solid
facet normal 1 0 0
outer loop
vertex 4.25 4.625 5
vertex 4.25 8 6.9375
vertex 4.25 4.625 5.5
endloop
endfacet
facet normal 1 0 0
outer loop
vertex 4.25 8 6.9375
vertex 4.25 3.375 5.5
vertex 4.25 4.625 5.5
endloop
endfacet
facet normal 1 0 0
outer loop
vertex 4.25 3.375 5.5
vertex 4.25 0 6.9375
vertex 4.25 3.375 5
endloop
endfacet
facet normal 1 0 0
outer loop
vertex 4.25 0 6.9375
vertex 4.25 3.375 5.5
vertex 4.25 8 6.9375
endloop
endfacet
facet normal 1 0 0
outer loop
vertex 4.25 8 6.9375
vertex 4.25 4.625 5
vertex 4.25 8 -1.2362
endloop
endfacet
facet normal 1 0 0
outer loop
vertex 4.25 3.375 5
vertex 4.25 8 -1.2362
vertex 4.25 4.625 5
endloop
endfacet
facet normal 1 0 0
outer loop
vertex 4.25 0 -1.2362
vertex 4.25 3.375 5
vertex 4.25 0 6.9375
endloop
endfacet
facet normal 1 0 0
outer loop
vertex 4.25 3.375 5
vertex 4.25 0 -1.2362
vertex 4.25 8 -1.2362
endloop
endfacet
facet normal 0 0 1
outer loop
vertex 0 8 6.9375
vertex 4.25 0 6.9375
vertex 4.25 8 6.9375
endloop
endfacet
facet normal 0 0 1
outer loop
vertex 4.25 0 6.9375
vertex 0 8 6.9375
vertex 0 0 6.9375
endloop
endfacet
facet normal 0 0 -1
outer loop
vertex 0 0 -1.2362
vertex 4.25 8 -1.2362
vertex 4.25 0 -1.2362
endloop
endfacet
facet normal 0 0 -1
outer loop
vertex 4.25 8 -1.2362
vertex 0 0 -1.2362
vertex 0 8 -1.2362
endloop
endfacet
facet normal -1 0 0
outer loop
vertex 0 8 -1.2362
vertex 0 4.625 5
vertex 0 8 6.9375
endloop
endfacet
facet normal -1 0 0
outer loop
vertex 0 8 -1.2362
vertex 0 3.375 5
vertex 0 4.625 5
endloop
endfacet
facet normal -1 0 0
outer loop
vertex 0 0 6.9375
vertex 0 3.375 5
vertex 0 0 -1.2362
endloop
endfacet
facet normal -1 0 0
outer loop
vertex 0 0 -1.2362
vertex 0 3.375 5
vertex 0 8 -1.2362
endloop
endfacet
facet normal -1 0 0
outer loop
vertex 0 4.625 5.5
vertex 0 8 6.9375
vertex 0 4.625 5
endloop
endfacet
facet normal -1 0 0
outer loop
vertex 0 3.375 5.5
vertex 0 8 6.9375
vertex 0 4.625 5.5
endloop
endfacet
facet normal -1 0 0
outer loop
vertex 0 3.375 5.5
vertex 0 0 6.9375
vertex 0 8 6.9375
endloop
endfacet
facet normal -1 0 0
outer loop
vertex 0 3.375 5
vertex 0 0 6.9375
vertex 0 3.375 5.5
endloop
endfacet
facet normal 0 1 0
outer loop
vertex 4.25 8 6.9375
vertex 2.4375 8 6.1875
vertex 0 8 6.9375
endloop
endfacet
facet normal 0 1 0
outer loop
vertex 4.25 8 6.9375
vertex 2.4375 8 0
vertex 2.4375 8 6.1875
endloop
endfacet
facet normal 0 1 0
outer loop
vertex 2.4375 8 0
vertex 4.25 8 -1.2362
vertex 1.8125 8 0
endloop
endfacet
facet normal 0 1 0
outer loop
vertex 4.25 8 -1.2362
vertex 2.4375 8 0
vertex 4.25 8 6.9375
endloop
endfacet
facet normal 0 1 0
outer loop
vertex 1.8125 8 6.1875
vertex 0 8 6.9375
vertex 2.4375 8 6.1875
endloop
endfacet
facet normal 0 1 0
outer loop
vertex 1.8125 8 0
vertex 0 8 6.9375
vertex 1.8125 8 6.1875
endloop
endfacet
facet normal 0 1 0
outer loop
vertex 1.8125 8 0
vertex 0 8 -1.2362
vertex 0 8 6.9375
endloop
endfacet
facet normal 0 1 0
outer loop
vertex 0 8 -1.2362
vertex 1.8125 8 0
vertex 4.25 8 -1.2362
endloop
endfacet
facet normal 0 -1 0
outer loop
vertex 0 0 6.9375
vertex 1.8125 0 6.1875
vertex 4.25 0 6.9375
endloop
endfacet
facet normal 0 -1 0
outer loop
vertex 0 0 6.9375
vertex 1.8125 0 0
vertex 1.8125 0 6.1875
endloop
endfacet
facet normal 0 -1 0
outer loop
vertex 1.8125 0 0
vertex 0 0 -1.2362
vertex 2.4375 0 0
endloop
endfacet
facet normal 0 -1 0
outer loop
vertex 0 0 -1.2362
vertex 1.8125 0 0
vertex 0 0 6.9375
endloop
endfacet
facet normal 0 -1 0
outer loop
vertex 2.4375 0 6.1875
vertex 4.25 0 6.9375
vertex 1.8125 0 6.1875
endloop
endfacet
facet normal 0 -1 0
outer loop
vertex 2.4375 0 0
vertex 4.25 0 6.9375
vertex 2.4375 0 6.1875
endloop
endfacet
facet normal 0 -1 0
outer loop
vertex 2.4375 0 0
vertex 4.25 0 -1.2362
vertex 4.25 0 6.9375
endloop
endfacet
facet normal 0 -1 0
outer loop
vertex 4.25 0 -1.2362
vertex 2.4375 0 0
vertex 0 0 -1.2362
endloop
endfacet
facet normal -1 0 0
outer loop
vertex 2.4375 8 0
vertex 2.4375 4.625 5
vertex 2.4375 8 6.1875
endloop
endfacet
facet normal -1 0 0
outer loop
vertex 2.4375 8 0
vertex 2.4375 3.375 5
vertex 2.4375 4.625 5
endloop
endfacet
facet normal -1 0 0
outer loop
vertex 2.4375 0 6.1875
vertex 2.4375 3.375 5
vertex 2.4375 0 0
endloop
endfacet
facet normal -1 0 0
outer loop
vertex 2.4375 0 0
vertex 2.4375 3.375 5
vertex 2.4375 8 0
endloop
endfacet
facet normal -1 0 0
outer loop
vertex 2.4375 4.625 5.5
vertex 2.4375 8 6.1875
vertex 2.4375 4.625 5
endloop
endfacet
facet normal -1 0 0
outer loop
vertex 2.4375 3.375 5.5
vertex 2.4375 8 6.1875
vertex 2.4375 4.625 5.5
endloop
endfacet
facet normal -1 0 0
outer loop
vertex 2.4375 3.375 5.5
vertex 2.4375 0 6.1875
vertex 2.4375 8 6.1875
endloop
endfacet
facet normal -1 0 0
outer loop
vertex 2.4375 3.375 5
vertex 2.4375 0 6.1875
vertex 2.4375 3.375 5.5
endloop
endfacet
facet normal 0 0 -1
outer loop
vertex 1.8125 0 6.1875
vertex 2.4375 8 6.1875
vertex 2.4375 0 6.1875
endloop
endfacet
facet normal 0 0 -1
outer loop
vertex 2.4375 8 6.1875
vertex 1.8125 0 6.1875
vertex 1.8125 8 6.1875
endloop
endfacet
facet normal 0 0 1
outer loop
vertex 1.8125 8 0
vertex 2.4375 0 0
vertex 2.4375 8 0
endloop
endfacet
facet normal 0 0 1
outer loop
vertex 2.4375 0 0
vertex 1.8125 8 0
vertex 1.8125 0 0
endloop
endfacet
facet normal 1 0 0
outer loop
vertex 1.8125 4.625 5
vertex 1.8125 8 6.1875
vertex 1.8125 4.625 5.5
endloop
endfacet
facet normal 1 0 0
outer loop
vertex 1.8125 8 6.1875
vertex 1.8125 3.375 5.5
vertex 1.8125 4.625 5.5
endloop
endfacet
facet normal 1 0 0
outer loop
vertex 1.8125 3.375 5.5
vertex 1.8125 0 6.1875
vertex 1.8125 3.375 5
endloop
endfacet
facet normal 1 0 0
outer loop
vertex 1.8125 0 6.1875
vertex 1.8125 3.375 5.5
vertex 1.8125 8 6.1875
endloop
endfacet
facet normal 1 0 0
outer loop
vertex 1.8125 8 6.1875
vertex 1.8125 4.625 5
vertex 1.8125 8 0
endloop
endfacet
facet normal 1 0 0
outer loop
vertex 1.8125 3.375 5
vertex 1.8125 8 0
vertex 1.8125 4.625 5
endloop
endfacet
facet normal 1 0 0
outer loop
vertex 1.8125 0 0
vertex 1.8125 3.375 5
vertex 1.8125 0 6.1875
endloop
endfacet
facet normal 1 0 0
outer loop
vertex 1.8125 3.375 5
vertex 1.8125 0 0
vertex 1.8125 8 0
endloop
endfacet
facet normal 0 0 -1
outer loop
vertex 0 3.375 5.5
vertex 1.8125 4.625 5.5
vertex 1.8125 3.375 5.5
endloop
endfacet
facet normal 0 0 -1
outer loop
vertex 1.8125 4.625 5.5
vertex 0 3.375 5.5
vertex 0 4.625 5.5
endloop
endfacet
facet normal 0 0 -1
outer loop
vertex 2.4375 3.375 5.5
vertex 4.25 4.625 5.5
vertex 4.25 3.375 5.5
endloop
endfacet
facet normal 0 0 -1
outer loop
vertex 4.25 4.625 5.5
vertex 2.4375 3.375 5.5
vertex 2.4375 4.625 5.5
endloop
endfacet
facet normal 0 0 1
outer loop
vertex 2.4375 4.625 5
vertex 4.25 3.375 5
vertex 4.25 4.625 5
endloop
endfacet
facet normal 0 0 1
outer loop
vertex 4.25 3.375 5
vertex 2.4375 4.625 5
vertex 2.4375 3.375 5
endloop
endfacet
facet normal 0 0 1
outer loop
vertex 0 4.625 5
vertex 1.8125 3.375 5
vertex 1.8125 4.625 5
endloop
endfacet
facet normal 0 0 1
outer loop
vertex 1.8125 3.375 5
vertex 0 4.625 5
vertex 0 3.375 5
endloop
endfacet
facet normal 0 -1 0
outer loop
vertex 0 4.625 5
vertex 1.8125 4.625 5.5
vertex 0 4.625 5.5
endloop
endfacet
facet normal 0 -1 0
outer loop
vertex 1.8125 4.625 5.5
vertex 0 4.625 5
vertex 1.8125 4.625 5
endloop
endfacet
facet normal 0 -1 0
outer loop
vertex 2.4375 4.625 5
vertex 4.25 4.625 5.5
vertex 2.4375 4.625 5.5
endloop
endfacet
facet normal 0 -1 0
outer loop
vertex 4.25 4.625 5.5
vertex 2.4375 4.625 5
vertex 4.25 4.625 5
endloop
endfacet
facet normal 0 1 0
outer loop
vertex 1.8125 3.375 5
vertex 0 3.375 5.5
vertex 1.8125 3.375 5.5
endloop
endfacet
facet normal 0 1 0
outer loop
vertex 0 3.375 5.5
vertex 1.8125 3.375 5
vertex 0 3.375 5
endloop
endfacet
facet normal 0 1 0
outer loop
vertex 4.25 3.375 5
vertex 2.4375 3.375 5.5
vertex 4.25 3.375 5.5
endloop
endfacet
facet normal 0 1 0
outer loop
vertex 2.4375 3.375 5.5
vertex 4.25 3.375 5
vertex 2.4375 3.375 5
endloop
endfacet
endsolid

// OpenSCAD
// file: TTvars.scad
barX=0.25;
barZ=6;
barLY=108;
barLX=60;

angX=1.5;
angT=0.125;
angLY=barLY;
angLX=barLX;

boltD=0.2362205;   // 6mm
boltL=1.968504;    // 50mm

brrOD=1;
brrID=0.25;
brrT=0.25;

sprOD=0.25;

bmountGap=0.1875;
bmountbrrGap=0.125;

//calculated

Y2Y=barLX+0.5;
X2X=8; //distance between X rails

bmountX=barX+((brrOD+1)*2);
bmountY=X2X;
bmountZ=barZ+bmountGap+brrOD-0.25+(1+boltD);
// main file
include <TTvars.scad>;

difference(){
translate([0,0,-(1+boltD)])    
cube([bmountX,bmountY,bmountZ]);

translate([(barX+((brrOD+1)*2)-(barX+(bmountGap*2)))/2,0,0])
cube([barX+(bmountGap*2),X2X,barZ+bmountGap]);    

translate([0,(X2X-(brrOD+(bmountbrrGap*2)))/2,barZ-brrT-sprOD-0.5])
cube([barX+((brrOD+1)*2),brrOD+(bmountbrrGap*2),brrT+(bmountbrrGap*2)]);    
    
    
    
    
    
    
} //end main difference
